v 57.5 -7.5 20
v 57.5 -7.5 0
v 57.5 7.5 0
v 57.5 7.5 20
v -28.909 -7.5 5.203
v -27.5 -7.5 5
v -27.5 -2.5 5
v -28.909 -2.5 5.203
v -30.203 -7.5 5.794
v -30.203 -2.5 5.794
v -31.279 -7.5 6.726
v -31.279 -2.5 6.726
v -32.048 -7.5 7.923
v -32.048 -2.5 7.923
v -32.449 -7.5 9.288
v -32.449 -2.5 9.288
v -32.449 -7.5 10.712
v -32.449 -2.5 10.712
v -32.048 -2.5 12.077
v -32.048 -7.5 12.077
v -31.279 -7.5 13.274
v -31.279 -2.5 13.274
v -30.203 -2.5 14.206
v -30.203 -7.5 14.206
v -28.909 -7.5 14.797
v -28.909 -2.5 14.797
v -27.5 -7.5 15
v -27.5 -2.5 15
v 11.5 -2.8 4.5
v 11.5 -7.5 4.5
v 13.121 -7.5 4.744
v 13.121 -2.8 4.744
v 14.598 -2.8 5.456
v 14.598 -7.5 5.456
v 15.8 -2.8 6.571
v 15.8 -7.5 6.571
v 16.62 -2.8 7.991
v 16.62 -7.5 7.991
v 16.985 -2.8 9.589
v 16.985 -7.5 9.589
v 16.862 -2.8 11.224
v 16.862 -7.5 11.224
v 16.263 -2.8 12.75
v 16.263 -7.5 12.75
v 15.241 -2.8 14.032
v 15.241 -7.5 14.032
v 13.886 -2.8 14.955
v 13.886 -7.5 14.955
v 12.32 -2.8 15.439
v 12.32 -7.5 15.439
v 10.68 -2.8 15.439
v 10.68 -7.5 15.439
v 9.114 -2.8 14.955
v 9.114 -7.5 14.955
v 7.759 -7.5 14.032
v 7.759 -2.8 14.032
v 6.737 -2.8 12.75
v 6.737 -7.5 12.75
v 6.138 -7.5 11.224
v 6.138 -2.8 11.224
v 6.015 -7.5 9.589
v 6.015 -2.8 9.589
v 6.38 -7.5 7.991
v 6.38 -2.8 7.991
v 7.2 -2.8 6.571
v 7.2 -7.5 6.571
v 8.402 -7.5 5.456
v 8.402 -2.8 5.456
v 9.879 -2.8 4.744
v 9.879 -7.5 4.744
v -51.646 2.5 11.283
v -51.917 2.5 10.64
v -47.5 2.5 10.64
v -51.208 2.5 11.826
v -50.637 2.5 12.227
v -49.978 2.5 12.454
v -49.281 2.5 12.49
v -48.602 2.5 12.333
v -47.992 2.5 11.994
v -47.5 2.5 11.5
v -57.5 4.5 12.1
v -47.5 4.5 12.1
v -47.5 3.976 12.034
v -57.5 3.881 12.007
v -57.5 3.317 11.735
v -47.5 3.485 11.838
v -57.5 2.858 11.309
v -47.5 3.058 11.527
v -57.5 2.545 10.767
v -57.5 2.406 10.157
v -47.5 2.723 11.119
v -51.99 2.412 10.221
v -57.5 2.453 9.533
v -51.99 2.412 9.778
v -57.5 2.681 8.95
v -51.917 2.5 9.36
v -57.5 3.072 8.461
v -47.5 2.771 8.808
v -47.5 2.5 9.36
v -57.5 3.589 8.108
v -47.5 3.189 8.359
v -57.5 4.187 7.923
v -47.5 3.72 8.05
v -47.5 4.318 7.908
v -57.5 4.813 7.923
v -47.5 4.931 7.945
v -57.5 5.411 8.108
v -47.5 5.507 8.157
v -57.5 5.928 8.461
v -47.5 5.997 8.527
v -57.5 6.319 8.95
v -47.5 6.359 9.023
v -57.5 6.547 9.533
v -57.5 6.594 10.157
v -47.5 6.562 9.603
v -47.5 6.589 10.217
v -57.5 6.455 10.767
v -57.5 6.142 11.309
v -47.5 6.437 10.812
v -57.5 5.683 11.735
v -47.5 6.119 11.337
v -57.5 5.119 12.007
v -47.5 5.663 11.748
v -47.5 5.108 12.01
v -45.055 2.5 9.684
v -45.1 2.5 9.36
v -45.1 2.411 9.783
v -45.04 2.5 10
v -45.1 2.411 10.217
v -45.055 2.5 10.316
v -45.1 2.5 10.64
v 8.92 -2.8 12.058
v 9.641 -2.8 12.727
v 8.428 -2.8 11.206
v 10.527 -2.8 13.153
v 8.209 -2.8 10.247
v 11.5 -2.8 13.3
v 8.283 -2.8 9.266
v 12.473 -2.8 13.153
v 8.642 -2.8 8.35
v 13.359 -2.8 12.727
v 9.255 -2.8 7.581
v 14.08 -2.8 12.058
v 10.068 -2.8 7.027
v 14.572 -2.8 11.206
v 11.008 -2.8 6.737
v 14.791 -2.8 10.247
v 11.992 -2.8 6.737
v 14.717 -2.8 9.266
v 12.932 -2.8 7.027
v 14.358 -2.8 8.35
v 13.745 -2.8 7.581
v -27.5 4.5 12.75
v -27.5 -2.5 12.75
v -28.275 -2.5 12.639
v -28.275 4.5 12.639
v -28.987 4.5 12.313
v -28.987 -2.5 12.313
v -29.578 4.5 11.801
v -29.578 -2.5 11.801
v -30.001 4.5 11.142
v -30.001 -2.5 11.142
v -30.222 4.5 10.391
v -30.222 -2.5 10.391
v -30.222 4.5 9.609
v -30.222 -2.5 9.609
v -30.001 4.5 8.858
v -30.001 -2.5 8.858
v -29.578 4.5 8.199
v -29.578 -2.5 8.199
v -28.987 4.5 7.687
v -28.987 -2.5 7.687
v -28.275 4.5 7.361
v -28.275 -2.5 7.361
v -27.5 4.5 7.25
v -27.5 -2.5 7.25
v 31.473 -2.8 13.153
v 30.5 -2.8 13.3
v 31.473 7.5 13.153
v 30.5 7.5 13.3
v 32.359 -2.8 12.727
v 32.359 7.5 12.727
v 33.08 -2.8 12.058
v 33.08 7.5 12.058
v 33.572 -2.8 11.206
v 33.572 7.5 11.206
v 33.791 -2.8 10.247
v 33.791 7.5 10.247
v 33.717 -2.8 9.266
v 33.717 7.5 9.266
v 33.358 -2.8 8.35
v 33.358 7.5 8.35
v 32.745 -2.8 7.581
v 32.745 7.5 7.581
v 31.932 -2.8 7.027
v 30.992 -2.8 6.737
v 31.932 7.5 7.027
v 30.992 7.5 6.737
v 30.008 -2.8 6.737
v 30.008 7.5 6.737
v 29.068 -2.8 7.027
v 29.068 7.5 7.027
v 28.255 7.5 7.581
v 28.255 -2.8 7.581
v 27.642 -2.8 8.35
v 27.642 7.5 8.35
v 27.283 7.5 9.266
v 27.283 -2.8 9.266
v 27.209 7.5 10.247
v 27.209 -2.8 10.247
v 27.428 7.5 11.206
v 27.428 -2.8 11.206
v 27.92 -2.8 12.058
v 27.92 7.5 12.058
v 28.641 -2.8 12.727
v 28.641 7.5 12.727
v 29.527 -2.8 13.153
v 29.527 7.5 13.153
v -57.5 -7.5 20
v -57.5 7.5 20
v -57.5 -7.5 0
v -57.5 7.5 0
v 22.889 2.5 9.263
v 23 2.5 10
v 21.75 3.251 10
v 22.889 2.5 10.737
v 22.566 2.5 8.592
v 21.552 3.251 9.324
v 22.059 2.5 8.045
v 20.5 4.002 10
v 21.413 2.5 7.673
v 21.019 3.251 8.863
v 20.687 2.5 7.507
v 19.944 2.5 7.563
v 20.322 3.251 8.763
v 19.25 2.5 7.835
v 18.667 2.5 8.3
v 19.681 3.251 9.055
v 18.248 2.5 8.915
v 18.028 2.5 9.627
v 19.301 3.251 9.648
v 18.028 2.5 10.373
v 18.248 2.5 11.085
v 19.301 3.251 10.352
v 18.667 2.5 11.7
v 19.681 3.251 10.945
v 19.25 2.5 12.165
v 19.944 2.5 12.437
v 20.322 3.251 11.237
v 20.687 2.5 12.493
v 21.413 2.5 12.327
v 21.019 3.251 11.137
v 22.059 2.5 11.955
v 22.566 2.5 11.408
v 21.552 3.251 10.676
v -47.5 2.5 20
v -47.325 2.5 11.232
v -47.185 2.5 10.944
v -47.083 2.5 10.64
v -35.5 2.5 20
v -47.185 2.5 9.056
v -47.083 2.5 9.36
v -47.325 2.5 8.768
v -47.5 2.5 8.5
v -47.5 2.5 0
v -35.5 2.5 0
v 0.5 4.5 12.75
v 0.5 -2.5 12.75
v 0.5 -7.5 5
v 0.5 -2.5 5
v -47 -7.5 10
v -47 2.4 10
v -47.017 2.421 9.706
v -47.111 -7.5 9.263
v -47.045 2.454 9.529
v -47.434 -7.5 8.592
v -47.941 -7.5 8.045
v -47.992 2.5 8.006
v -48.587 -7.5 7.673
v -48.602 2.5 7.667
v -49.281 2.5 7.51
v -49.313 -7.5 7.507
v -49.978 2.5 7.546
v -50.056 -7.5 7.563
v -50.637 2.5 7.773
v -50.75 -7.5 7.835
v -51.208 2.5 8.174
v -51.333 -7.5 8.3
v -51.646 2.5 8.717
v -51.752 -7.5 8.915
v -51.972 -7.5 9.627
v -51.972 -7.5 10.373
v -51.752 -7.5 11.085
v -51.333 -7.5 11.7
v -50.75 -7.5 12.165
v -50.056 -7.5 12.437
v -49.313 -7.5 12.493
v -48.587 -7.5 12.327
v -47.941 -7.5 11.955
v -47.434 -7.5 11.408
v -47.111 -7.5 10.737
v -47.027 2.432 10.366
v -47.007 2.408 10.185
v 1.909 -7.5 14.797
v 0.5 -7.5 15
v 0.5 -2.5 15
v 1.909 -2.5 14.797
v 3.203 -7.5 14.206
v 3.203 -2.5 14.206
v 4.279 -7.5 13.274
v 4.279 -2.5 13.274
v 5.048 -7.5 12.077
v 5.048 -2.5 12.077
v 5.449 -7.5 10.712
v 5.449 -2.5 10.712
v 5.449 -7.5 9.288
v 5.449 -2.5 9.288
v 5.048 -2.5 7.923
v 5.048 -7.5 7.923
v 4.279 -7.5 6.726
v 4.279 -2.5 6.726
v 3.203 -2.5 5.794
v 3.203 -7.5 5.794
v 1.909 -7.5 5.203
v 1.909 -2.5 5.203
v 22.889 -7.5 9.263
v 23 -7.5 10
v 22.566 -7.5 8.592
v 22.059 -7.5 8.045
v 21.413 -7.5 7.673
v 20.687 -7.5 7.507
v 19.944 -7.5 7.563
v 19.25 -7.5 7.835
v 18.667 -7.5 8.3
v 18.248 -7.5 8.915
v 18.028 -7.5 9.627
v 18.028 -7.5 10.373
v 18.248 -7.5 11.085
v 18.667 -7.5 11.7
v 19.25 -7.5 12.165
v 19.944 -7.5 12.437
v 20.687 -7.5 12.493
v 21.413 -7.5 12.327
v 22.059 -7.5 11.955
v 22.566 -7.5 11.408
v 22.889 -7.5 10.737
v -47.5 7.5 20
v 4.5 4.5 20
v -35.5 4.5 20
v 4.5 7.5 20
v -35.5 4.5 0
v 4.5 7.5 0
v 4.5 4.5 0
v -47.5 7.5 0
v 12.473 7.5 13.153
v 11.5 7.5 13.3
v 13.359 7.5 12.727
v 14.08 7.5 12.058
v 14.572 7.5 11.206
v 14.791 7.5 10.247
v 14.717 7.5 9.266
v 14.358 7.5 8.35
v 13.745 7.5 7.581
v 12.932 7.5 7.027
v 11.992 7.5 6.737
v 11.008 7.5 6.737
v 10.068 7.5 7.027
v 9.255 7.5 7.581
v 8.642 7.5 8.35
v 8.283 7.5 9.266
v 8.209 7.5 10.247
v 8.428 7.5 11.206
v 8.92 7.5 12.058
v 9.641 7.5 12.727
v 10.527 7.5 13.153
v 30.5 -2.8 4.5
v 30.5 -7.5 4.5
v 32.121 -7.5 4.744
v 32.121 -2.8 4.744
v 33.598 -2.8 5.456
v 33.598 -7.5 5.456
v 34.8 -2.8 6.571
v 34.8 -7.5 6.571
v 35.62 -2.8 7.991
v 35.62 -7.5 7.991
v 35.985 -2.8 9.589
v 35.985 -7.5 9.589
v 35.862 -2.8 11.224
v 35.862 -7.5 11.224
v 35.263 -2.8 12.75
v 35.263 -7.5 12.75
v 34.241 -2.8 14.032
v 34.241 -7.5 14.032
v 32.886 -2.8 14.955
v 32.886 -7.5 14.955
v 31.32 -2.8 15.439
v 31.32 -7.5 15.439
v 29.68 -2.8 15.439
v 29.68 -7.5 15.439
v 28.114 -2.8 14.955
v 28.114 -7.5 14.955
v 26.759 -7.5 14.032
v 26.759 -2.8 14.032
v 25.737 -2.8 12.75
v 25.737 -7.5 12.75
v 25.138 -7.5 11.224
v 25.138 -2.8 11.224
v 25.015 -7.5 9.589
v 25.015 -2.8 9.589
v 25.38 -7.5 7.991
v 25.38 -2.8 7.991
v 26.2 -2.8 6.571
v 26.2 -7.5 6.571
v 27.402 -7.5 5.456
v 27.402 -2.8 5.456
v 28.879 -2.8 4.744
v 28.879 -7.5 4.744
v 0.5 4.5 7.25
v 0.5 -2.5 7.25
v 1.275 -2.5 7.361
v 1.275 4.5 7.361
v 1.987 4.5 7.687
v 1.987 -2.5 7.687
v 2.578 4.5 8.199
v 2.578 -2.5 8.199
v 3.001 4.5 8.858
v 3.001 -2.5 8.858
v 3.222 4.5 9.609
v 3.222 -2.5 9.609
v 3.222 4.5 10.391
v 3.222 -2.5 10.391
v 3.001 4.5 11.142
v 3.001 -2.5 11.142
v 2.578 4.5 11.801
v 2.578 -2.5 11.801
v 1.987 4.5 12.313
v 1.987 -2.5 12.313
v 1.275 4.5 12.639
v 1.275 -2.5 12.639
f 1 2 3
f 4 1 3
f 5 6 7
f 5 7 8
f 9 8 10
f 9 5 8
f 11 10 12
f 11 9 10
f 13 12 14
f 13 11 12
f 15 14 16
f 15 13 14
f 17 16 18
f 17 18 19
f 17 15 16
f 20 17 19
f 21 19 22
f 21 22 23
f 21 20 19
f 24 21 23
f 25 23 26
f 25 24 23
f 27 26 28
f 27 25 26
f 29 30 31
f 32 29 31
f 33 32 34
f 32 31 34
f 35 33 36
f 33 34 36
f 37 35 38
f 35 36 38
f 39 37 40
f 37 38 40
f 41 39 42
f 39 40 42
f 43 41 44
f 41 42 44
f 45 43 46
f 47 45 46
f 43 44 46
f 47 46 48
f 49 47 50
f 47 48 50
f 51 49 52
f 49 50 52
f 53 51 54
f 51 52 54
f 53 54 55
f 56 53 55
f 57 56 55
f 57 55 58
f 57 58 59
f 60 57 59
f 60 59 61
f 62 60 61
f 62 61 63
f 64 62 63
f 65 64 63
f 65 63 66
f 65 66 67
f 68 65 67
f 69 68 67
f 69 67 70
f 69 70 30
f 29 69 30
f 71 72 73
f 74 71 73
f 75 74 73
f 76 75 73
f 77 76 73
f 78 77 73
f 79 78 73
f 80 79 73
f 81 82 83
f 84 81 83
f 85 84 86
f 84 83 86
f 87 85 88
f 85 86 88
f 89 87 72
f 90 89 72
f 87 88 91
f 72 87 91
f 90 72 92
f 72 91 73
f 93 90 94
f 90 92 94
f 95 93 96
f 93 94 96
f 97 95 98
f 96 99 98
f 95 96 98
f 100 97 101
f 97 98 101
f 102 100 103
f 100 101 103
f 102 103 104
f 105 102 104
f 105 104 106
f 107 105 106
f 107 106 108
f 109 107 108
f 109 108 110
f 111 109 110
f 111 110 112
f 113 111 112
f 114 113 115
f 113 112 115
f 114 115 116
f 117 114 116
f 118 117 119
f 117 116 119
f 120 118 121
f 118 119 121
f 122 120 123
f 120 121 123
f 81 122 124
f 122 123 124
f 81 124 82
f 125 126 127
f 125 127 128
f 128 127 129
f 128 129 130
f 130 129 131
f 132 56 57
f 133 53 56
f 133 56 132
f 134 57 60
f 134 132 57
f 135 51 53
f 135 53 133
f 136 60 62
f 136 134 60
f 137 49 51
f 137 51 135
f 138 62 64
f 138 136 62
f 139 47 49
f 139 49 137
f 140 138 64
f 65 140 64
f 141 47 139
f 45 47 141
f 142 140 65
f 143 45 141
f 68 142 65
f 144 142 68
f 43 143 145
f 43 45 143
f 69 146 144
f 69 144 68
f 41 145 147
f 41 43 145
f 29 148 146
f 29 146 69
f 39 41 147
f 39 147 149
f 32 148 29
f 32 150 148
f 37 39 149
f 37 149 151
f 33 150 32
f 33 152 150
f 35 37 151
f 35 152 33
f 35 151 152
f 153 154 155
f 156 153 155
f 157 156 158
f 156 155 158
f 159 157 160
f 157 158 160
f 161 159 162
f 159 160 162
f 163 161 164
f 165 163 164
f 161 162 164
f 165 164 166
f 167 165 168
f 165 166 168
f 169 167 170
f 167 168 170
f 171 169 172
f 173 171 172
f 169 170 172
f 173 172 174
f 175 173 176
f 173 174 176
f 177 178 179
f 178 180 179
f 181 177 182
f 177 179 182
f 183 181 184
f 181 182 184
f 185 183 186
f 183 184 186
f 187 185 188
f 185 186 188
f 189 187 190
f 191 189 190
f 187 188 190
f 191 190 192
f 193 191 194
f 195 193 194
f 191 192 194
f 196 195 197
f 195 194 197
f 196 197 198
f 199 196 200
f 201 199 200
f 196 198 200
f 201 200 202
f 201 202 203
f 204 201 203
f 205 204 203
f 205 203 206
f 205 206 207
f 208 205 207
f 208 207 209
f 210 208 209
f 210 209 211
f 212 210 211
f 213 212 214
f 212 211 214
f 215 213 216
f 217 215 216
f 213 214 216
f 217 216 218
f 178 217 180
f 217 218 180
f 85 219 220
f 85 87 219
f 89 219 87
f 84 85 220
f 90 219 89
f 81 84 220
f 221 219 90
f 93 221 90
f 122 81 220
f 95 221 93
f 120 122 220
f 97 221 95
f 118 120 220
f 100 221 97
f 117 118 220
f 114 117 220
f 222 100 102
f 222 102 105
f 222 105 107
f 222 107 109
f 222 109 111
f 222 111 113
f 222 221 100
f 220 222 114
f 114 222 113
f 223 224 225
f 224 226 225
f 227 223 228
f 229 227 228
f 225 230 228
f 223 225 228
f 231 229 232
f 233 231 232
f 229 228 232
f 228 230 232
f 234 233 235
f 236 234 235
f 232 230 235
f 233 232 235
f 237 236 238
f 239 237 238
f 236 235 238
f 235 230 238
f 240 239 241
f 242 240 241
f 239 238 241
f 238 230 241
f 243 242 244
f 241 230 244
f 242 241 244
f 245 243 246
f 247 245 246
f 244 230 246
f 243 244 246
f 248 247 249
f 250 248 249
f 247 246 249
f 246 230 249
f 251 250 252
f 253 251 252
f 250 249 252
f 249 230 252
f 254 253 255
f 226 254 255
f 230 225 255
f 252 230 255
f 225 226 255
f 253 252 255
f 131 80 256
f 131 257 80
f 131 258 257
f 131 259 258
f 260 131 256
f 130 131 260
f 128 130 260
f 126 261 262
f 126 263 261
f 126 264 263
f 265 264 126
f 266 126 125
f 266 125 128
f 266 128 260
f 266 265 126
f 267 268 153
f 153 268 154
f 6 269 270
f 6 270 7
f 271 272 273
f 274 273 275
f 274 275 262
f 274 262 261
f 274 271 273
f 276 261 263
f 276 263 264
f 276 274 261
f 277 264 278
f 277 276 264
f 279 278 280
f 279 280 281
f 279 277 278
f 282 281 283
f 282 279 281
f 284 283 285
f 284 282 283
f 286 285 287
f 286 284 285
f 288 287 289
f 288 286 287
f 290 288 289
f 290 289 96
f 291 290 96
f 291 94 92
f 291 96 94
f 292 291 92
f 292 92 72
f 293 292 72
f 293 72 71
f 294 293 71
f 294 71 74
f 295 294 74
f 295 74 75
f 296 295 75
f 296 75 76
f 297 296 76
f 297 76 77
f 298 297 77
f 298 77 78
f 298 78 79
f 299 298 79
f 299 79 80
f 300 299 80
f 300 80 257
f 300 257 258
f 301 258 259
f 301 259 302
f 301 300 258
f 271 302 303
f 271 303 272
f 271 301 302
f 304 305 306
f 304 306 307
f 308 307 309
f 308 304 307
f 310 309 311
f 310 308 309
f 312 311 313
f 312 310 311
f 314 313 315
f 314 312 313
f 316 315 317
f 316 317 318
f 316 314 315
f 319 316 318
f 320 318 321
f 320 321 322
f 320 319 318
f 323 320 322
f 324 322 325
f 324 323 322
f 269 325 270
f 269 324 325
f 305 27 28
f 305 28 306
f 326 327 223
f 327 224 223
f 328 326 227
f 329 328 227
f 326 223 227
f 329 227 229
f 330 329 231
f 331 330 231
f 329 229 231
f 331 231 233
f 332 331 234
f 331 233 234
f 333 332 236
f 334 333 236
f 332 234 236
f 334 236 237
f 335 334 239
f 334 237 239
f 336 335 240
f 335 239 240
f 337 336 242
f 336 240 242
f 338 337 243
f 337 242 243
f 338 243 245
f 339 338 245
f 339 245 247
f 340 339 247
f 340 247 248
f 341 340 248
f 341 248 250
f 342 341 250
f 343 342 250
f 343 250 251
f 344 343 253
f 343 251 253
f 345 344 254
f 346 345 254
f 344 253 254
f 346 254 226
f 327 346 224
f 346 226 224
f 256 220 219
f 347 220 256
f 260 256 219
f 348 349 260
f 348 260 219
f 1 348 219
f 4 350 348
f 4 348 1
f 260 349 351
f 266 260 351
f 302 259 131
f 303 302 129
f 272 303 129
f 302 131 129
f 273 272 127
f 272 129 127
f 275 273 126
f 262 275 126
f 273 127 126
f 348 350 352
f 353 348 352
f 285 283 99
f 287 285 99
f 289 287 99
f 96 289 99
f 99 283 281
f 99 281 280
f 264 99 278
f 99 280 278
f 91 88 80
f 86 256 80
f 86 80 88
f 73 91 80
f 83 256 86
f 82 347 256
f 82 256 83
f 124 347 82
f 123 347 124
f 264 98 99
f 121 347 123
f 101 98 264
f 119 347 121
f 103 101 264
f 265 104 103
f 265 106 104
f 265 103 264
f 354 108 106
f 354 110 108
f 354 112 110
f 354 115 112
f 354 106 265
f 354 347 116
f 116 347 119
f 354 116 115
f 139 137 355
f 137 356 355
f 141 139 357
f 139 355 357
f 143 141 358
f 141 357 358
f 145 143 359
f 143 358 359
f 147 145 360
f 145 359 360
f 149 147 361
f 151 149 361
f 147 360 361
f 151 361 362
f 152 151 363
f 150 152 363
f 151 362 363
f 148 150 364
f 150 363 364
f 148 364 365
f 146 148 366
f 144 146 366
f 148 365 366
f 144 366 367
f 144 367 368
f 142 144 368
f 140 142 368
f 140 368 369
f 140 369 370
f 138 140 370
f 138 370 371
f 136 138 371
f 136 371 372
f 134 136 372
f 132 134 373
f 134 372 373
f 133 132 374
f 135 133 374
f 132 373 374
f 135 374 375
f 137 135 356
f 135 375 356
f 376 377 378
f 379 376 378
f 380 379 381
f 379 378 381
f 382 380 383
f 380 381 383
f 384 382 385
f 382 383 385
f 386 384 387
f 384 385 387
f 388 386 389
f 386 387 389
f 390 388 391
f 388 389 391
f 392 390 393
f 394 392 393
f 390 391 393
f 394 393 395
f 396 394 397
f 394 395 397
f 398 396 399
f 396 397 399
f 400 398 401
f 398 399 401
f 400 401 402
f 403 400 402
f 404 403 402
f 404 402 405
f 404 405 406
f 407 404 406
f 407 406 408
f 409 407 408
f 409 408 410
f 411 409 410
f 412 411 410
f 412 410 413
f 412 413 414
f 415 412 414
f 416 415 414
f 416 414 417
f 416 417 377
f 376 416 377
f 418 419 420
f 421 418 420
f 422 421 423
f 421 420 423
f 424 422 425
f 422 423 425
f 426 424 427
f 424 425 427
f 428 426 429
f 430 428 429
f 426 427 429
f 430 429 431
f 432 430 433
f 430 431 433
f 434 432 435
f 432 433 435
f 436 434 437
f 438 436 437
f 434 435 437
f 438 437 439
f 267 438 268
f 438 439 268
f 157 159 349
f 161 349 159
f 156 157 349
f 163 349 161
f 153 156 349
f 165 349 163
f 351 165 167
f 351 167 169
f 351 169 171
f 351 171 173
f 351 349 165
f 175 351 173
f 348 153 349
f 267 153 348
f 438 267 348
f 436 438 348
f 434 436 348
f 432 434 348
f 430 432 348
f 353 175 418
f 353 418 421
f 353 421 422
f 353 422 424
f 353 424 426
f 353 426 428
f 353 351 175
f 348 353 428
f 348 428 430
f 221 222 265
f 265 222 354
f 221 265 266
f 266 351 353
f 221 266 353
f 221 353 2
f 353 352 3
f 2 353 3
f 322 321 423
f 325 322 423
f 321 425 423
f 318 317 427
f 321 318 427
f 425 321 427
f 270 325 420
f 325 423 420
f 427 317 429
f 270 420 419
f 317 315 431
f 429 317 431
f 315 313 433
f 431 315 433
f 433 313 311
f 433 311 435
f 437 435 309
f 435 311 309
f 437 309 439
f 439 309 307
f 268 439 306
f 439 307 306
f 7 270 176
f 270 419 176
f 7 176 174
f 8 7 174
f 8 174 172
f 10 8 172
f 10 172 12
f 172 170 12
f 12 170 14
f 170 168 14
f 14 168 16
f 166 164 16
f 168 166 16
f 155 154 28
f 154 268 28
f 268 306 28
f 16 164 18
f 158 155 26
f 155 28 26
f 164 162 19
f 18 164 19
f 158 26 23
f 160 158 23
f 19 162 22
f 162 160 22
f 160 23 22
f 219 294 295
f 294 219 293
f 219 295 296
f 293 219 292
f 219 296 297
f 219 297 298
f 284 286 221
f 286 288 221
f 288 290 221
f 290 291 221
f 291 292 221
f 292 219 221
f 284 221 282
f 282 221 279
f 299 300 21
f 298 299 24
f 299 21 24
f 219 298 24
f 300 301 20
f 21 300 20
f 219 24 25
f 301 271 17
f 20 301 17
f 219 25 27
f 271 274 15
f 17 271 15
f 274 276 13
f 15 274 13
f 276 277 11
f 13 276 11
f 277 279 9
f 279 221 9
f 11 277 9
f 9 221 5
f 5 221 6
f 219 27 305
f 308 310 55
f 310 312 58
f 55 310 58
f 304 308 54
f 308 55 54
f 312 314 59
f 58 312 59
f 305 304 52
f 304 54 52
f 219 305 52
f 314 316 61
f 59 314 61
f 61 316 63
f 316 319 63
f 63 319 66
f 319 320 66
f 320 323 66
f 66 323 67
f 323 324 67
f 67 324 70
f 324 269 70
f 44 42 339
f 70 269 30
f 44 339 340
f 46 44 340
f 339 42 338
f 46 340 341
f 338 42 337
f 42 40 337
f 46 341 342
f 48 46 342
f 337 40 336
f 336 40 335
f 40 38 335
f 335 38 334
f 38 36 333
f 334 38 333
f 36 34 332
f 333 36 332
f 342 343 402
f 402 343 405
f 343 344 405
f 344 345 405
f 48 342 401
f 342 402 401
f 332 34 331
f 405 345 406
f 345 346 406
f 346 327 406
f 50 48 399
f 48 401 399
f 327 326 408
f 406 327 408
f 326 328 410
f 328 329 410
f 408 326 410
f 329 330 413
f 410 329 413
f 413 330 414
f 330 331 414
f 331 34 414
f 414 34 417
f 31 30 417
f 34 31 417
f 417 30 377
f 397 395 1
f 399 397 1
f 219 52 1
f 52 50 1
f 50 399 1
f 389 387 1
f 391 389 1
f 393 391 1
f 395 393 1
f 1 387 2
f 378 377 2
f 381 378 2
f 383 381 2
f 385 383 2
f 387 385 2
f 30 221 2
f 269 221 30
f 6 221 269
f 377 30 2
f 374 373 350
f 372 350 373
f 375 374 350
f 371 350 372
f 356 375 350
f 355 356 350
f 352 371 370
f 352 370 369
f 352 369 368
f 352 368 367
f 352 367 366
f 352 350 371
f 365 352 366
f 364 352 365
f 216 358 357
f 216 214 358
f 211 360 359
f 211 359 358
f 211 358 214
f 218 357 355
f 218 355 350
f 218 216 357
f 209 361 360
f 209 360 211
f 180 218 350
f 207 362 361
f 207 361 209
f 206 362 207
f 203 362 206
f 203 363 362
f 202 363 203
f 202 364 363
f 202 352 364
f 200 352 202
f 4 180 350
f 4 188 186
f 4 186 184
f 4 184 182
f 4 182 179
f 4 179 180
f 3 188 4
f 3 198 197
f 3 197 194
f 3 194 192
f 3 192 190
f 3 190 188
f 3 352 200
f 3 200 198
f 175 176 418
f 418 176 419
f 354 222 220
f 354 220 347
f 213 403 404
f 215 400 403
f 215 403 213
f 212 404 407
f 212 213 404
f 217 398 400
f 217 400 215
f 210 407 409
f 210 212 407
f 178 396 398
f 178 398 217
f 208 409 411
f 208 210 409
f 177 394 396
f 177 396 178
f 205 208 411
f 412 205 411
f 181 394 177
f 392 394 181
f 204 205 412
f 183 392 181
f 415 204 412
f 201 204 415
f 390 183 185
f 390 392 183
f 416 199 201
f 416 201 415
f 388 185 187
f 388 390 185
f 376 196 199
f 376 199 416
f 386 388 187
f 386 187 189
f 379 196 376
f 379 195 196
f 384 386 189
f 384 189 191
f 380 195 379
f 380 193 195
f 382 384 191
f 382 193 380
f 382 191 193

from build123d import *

# Parameters (mm, degrees)
SKETCH_1_W                 = 115
SKETCH_1_H                 = 15
EXTRUDE_1_DEPTH            = 20
SKETCH_2_W                 = 12
SKETCH_2_H                 = 20
CUT_EXTRUDE_1_DEPTH        = 5
SKETCH_3_W                 = 40
SKETCH_3_H                 = 20
CUT_EXTRUDE_2_DEPTH        = 3
HOLE_START                 = -7.5
HOLE_WIZARD_M6_1_OUTLINE_R = 2.5
HOLE_WIZARD_M6_1_DEPTH     = 10
CUT_EXTRUDE_3_DEPTH        = 5
CUT_EXTRUDE_4_DEPTH        = 20
HOLE_WIZARD_3_D            = 6.6
HOLE_WIZARD_3_DEPTH        = 15
HOLE_WIZARD_3_CBORE_D      = 11
HOLE_WIZARD_3_CBORE_DEPTH  = 4.7
HOLE_WIZARD_3_TIP          = 1.982840043
HOLE_WIZARD_M5_1_D         = 4.2
HOLE_WIZARD_M5_1_DEPTH     = 12.4
HOLE_WIZARD_M5_1_TIP       = 1.2618073


# Read off the part's stored shape, not the designer's step: M6 螺纹孔1
with BuildPart() as part:
    # 草图1 → 凸台-拉伸1 (new body)
    with BuildSketch(Plane.XY):
        Rectangle(SKETCH_1_W, SKETCH_1_H)
    extrude(amount=EXTRUDE_1_DEPTH)

    # 草图2 → 切除-拉伸1 (cut)
    with BuildSketch(Plane(origin=(0, 7.5, 0), x_dir=(1, 0, 0), z_dir=(0, 1, 0))):
        with Locations((-41.5, -10)):
            Rectangle(SKETCH_2_W, SKETCH_2_H)
    extrude(amount=-CUT_EXTRUDE_1_DEPTH, mode=Mode.SUBTRACT)

    # 草图3 → 切除-拉伸2 (cut)
    with BuildSketch(Plane(origin=(0, 7.5, 0), x_dir=(1, 0, 0), z_dir=(0, 1, 0))):
        with Locations((-15.5, -10)):
            Rectangle(SKETCH_3_W, SKETCH_3_H)
    extrude(amount=-CUT_EXTRUDE_2_DEPTH, mode=Mode.SUBTRACT)

    # M6 螺纹孔1 outline → M6 螺纹孔1 (cut)
    with BuildSketch(Plane(origin=(0, 0, 0), x_dir=(1, 0, 0), z_dir=(0, 1, 0)).offset(HOLE_START)):
        with Locations((-49.5, -10)):
            Circle(HOLE_WIZARD_M6_1_OUTLINE_R)
    extrude(amount=HOLE_WIZARD_M6_1_DEPTH, mode=Mode.SUBTRACT)

    # Hole Wizard M6 _1 2 outline → Hole Wizard M6 _1 2 (revolve, cut)
    with BuildSketch(Plane(origin=(20.5, 0, 10), x_dir=(1, 0, 0), z_dir=(0, 0, 1))):
        Polygon((2.5, 2.5), (0, 4.002151548), (0, -7.5), (2.5, -7.5), align=None)
    revolve(axis=Axis((20.5, 0, 10), (0, 1, 0)), mode=Mode.SUBTRACT)

    # 草图6 → 切除-拉伸3 (cut)
    with BuildSketch(Plane.XZ.offset(7.5)):
        with BuildLine():
            Line((-27.5, 15), (0.5, 15))
            ThreePointArc((0.5, 15), (5.5, 10), (0.5, 5))
            Line((0.5, 5), (-27.5, 5))
            ThreePointArc((-27.5, 5), (-32.5, 10), (-27.5, 15))
        make_face()
    extrude(amount=-CUT_EXTRUDE_3_DEPTH, mode=Mode.SUBTRACT)

    # 草图7 → 切除-拉伸4 (cut)
    with BuildSketch(Plane.XZ.offset(2.5)):
        with BuildLine():
            Line((-27.5, 7.25), (0.5, 7.25))
            ThreePointArc((0.5, 7.25), (3.25, 10), (0.5, 12.75))
            Line((0.5, 12.75), (-27.5, 12.75))
            ThreePointArc((-27.5, 12.75), (-30.25, 10), (-27.5, 7.25))
        make_face()
    extrude(amount=-CUT_EXTRUDE_4_DEPTH, mode=Mode.SUBTRACT)

    # 打孔尺寸(%根据)内六角花形圆柱头螺钉3
    with Locations(Plane(origin=(11.5, -7.5, 10), x_dir=(0, 0, -1), z_dir=(0, -1, 0))):
        with Locations((0, 0), (0, 19)):
            CounterBoreHole(HOLE_WIZARD_3_D / 2, HOLE_WIZARD_3_CBORE_D / 2, HOLE_WIZARD_3_CBORE_DEPTH, depth=HOLE_WIZARD_3_DEPTH)
            with Locations((0, 0, -(HOLE_WIZARD_3_DEPTH + HOLE_WIZARD_3_TIP / 2))):  # 118° drill point
                Cone(0, HOLE_WIZARD_3_D / 2, HOLE_WIZARD_3_TIP, mode=Mode.SUBTRACT)

    # M5 螺纹孔1
    with Locations(Plane(origin=(-57.5, 4.5, 10), x_dir=(0, 0, -1), z_dir=(-1, 0, 0))):
        with Locations((0, 0)):
            Hole(HOLE_WIZARD_M5_1_D / 2, depth=HOLE_WIZARD_M5_1_DEPTH)
            with Locations((0, 0, -(HOLE_WIZARD_M5_1_DEPTH + HOLE_WIZARD_M5_1_TIP / 2))):  # 118° drill point
                Cone(0, HOLE_WIZARD_M5_1_D / 2, HOLE_WIZARD_M5_1_TIP, mode=Mode.SUBTRACT)


solid = part.part
